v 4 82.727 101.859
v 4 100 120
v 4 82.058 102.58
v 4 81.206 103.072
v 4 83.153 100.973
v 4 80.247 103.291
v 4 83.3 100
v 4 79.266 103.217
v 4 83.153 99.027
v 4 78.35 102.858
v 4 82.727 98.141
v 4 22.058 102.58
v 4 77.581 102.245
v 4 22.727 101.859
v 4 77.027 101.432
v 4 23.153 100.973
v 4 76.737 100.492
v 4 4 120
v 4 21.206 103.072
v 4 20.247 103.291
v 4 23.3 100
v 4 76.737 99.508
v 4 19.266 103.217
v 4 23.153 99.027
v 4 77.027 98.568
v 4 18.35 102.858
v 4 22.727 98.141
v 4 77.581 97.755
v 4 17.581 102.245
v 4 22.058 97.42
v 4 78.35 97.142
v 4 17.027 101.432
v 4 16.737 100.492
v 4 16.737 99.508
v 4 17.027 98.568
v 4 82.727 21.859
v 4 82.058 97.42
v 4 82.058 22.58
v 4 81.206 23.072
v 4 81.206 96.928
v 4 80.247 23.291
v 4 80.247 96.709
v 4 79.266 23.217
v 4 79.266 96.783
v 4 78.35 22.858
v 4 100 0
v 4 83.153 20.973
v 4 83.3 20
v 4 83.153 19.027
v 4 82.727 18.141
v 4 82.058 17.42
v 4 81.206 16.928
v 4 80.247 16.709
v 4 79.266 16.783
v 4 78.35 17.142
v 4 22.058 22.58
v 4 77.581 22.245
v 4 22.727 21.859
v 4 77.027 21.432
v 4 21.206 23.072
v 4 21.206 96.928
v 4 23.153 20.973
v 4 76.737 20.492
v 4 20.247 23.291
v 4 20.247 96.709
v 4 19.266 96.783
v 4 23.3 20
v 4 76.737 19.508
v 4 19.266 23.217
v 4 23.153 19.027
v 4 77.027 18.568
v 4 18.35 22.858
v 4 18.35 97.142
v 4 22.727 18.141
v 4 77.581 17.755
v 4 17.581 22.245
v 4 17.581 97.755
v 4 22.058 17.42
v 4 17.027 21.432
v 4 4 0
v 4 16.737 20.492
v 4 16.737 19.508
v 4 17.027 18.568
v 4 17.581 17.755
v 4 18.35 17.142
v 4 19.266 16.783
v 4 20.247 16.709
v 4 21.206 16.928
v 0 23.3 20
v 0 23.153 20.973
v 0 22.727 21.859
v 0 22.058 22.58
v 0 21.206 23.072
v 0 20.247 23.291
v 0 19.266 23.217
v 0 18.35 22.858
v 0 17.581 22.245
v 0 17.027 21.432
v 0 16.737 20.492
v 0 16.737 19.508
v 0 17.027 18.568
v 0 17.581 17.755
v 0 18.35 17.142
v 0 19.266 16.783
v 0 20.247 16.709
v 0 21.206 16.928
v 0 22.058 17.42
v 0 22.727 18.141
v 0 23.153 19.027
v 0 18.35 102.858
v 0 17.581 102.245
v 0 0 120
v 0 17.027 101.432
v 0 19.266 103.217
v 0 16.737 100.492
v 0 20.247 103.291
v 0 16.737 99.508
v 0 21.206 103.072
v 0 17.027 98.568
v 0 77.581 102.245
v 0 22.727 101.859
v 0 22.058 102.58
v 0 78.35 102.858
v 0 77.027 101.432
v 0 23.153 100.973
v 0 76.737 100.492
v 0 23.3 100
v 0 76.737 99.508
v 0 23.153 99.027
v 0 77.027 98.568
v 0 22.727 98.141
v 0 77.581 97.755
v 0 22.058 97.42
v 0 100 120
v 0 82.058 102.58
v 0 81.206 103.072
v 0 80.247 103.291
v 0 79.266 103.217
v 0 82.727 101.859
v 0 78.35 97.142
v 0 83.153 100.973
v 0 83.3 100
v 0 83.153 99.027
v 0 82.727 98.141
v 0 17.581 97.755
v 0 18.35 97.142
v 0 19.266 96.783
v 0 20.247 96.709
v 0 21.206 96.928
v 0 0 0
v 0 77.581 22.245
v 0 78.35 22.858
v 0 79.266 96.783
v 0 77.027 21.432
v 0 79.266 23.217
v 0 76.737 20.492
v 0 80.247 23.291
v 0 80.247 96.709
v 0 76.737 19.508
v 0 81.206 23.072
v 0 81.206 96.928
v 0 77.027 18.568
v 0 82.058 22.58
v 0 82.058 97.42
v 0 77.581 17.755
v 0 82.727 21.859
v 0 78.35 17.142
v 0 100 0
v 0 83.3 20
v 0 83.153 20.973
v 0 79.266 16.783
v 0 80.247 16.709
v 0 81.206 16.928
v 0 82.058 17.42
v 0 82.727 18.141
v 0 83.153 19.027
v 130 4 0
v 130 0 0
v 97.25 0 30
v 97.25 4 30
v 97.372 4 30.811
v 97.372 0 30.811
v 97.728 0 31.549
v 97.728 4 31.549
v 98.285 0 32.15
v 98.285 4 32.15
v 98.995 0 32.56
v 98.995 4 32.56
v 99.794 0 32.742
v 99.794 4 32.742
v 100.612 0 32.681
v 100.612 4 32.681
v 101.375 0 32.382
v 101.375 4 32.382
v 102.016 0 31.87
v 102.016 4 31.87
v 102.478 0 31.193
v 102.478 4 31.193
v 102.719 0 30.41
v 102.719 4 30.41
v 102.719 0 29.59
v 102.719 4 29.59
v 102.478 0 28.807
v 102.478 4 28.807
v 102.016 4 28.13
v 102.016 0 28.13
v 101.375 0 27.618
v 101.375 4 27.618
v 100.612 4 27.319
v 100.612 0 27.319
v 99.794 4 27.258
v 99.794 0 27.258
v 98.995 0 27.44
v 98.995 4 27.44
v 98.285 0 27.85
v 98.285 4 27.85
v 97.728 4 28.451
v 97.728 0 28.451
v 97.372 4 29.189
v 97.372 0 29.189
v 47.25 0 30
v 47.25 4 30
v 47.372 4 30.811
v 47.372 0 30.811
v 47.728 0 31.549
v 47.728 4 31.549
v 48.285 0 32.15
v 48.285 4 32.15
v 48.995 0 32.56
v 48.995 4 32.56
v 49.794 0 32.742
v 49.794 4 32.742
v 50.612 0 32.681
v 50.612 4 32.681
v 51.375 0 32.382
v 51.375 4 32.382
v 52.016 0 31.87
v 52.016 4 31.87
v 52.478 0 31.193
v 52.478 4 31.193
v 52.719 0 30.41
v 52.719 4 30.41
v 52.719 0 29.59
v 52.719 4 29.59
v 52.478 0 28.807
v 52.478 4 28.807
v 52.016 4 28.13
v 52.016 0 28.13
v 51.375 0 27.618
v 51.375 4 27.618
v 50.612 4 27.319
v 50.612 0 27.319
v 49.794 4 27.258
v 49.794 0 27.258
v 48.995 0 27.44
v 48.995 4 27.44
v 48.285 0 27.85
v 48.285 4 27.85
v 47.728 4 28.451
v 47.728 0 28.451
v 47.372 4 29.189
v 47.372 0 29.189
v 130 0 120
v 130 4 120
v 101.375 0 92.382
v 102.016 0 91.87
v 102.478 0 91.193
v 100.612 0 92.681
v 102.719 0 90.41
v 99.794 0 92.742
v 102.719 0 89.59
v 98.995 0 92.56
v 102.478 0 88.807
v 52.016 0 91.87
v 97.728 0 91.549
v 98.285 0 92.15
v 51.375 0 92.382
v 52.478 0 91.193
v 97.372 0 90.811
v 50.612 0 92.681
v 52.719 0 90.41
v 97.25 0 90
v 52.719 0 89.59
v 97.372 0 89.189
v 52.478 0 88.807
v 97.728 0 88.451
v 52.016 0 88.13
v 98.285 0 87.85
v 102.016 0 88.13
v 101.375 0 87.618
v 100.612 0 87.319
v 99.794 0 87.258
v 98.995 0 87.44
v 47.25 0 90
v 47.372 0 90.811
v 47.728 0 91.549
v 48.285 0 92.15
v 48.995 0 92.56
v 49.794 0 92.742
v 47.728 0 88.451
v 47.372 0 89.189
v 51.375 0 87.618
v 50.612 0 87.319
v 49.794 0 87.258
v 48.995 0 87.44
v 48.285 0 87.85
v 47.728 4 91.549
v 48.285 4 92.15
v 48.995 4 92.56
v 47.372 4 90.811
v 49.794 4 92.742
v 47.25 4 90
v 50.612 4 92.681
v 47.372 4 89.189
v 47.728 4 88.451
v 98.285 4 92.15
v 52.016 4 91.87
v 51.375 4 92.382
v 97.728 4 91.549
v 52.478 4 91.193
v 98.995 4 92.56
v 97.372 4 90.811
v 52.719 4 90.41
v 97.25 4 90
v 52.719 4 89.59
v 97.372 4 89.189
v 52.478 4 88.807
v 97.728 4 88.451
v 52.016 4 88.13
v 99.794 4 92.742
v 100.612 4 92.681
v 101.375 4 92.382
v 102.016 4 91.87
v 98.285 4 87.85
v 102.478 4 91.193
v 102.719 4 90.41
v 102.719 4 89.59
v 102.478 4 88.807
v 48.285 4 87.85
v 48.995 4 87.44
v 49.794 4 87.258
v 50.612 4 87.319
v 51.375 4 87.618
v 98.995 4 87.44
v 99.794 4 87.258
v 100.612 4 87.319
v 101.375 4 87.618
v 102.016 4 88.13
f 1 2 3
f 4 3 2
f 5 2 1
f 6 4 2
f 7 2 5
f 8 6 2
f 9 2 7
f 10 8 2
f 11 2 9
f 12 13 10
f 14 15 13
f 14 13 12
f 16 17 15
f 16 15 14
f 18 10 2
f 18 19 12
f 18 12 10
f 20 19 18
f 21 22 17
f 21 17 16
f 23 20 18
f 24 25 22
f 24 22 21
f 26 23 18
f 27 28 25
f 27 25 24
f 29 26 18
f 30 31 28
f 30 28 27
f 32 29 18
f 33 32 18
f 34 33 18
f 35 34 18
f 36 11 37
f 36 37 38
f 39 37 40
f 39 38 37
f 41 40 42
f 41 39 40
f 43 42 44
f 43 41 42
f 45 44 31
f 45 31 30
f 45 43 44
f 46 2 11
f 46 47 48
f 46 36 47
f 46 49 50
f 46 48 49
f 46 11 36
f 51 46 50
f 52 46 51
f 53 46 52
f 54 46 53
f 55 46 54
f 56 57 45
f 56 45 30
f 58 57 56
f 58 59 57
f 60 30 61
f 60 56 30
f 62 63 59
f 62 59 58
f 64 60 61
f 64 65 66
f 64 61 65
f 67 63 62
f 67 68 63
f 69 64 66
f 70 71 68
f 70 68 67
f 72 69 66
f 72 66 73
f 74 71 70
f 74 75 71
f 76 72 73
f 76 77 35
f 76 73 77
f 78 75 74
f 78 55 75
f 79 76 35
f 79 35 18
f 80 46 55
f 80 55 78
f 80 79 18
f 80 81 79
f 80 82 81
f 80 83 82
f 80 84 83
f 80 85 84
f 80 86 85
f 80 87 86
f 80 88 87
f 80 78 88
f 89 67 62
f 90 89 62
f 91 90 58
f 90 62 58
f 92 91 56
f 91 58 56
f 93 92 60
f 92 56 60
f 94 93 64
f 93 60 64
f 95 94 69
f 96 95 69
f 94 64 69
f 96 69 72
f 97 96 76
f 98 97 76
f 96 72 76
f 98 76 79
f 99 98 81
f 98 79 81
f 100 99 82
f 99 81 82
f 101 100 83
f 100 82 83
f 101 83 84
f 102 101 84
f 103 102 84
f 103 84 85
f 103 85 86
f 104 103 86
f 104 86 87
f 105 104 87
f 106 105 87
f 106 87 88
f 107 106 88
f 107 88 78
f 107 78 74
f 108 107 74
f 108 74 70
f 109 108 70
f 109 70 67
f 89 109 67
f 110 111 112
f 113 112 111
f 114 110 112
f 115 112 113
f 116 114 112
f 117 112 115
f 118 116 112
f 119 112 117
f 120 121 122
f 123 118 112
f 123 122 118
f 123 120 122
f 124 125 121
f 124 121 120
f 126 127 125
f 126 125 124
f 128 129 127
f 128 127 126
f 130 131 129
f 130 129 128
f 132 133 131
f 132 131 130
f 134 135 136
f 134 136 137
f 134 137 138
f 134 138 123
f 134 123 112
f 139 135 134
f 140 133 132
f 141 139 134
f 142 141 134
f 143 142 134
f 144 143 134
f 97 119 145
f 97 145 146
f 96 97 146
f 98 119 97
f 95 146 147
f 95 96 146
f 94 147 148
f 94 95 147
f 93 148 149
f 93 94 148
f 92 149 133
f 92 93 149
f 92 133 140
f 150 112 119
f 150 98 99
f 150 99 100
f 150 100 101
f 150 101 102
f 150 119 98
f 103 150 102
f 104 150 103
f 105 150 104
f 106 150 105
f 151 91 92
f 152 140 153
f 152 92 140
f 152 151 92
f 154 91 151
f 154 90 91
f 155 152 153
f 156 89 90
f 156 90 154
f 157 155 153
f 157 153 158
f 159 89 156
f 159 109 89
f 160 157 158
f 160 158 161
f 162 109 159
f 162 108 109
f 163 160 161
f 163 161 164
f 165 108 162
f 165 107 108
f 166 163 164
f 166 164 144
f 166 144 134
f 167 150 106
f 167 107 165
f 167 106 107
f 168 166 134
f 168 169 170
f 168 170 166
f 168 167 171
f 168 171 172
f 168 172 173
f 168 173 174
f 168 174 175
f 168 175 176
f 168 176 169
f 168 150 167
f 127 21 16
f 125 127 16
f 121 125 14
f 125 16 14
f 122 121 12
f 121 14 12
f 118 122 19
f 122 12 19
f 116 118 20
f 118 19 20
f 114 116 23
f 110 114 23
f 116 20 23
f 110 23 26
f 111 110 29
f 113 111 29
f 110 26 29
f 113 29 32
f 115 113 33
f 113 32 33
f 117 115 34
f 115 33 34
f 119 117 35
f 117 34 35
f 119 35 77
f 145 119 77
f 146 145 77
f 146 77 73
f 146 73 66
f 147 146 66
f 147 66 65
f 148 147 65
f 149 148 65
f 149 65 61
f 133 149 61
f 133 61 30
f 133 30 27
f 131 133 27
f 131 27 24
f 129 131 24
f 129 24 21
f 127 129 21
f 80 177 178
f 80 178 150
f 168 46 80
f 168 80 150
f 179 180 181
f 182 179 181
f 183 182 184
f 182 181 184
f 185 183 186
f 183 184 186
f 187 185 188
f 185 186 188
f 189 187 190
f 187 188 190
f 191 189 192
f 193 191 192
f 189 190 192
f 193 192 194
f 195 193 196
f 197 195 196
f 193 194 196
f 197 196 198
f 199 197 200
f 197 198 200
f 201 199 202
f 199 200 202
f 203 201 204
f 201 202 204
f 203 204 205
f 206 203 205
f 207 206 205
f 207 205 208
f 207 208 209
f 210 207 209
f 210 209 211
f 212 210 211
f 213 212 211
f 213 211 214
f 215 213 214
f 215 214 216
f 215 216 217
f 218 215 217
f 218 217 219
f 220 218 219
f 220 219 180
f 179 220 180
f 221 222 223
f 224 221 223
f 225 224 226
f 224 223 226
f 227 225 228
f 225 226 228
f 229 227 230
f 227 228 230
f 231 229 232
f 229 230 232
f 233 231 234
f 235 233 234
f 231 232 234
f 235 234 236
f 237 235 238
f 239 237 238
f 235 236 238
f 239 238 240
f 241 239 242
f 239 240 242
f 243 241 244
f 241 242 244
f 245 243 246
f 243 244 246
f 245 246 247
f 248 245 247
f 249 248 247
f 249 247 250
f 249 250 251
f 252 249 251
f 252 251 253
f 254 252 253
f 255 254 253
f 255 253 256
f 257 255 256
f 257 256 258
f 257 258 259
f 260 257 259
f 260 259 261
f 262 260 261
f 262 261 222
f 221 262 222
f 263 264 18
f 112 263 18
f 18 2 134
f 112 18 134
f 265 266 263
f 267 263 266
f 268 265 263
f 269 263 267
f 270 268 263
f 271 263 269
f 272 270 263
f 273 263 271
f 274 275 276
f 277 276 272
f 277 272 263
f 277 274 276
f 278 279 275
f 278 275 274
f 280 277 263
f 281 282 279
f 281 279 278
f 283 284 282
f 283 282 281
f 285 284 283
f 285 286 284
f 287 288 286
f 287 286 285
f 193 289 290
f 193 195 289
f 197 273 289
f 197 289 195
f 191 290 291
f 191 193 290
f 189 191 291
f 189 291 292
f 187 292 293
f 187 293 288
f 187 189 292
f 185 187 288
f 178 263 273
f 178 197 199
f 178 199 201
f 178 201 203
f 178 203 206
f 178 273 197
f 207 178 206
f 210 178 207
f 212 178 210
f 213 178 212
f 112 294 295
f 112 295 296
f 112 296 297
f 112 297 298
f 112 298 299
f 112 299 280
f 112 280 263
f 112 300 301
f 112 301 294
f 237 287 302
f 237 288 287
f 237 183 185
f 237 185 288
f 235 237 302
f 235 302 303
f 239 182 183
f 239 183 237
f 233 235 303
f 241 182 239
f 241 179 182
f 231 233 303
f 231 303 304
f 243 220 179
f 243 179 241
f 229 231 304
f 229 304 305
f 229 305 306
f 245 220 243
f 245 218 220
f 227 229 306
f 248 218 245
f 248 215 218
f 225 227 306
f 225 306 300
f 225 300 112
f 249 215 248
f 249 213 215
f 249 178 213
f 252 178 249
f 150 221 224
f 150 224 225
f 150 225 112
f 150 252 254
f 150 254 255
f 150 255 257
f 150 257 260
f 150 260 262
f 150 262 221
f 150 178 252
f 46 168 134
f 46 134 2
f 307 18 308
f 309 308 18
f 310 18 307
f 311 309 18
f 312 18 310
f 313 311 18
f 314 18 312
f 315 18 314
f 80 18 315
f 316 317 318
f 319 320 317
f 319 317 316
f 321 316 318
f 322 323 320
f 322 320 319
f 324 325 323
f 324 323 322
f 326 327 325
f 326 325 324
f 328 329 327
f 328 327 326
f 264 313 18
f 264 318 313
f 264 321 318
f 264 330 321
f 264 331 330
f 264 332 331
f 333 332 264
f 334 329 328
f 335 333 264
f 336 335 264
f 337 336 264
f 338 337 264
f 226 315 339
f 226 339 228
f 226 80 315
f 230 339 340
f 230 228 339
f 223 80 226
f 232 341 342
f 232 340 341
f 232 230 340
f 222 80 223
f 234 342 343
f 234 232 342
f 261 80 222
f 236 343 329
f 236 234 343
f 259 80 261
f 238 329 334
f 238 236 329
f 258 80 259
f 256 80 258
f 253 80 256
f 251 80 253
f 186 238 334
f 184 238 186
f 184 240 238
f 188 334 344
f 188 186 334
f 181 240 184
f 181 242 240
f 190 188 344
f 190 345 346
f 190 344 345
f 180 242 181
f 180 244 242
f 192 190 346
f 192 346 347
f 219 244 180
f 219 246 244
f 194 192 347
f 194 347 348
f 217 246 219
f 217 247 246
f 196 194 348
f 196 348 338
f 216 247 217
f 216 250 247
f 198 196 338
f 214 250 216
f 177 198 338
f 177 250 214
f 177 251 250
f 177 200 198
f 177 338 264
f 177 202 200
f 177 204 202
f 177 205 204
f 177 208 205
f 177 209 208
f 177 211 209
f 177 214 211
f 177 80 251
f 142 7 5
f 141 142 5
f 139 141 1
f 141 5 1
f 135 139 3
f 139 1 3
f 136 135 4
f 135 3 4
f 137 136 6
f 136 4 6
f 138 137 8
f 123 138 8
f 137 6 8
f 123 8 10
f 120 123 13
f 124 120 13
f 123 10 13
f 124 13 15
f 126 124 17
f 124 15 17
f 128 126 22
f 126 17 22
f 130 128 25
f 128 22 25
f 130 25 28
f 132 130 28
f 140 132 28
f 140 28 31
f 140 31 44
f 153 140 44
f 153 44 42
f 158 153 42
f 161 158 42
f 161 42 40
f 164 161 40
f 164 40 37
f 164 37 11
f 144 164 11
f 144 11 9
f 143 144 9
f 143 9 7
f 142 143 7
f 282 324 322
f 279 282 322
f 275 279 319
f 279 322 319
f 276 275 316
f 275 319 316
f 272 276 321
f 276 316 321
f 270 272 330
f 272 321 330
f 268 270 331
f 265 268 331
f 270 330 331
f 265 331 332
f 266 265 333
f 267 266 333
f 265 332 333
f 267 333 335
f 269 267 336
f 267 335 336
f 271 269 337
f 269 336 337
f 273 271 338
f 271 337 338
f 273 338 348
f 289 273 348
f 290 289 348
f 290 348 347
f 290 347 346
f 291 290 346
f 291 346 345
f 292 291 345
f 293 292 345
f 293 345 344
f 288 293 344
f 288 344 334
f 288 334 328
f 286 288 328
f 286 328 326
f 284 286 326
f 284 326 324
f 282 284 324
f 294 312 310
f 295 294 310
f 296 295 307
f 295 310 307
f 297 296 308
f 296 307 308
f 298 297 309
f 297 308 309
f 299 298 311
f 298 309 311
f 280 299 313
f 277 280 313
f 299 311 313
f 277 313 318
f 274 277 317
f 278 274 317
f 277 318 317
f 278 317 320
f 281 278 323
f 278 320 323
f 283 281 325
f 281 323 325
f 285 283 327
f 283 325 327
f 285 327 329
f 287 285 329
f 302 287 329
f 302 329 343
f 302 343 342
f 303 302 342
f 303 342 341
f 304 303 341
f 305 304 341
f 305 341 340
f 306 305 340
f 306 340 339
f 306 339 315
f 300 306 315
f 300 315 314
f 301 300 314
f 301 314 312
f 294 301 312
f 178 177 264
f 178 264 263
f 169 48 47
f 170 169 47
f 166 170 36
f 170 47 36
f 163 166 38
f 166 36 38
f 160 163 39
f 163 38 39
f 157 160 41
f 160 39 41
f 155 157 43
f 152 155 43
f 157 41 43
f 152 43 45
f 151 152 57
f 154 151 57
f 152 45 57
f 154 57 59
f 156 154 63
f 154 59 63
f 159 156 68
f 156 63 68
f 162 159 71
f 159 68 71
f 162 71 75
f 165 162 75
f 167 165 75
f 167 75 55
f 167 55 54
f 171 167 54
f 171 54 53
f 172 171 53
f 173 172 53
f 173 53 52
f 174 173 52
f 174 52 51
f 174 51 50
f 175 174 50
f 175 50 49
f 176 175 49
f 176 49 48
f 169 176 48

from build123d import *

# Parameters (mm, degrees)
BOSS_EXTRUDE1_DEPTH = 120
SKETCH4_R           = 3.3
CUT_EXTRUDE1_DEPTH  = 201.688813839
SKETCH5_R           = 2.75
CUT_EXTRUDE2_DEPTH  = 202.285866369


with BuildPart() as part:
    # Sketch2 → Boss-Extrude1 (new body)
    with BuildSketch(Plane.XY):
        Polygon((0, 0), (0, 100), (4, 100), (4, 4), (130, 4), (130, 0), align=None)
    extrude(amount=BOSS_EXTRUDE1_DEPTH)

    # Sketch4 → Cut-Extrude1 (cut, through all)
    with BuildSketch(Plane(origin=(4, 0, 0), x_dir=(0, 0, -1), z_dir=(1, 0, 0))):
        with Locations(Location((-100, 80, 0), (0, 0, 90))):
            Circle(SKETCH4_R)
        with Locations(Location((-20, 80, 0), (0, 0, 90))):
            Circle(SKETCH4_R)
        with Locations(Location((-20, 20, 0), (0, 0, 90))):
            Circle(SKETCH4_R)
        with Locations(Location((-100, 20, 0), (0, 0, 90))):
            Circle(SKETCH4_R)
    extrude(amount=-CUT_EXTRUDE1_DEPTH, mode=Mode.SUBTRACT)

    # Sketch5 → Cut-Extrude2 (cut, through all)
    with BuildSketch(Plane(origin=(0, 4, 0), x_dir=(1, 0, 0), z_dir=(0, 1, 0))):
        with Locations(Location((100, -30, 0), (0, 0, 180))):
            Circle(SKETCH5_R)
        with Locations(Location((50, -30, 0), (0, 0, 180))):
            Circle(SKETCH5_R)
        with Locations(Location((50, -90, 0), (0, 0, 180))):
            Circle(SKETCH5_R)
        with Locations(Location((100, -90, 0), (0, 0, 180))):
            Circle(SKETCH5_R)
    extrude(amount=-CUT_EXTRUDE2_DEPTH, mode=Mode.SUBTRACT)


solid = part.part
